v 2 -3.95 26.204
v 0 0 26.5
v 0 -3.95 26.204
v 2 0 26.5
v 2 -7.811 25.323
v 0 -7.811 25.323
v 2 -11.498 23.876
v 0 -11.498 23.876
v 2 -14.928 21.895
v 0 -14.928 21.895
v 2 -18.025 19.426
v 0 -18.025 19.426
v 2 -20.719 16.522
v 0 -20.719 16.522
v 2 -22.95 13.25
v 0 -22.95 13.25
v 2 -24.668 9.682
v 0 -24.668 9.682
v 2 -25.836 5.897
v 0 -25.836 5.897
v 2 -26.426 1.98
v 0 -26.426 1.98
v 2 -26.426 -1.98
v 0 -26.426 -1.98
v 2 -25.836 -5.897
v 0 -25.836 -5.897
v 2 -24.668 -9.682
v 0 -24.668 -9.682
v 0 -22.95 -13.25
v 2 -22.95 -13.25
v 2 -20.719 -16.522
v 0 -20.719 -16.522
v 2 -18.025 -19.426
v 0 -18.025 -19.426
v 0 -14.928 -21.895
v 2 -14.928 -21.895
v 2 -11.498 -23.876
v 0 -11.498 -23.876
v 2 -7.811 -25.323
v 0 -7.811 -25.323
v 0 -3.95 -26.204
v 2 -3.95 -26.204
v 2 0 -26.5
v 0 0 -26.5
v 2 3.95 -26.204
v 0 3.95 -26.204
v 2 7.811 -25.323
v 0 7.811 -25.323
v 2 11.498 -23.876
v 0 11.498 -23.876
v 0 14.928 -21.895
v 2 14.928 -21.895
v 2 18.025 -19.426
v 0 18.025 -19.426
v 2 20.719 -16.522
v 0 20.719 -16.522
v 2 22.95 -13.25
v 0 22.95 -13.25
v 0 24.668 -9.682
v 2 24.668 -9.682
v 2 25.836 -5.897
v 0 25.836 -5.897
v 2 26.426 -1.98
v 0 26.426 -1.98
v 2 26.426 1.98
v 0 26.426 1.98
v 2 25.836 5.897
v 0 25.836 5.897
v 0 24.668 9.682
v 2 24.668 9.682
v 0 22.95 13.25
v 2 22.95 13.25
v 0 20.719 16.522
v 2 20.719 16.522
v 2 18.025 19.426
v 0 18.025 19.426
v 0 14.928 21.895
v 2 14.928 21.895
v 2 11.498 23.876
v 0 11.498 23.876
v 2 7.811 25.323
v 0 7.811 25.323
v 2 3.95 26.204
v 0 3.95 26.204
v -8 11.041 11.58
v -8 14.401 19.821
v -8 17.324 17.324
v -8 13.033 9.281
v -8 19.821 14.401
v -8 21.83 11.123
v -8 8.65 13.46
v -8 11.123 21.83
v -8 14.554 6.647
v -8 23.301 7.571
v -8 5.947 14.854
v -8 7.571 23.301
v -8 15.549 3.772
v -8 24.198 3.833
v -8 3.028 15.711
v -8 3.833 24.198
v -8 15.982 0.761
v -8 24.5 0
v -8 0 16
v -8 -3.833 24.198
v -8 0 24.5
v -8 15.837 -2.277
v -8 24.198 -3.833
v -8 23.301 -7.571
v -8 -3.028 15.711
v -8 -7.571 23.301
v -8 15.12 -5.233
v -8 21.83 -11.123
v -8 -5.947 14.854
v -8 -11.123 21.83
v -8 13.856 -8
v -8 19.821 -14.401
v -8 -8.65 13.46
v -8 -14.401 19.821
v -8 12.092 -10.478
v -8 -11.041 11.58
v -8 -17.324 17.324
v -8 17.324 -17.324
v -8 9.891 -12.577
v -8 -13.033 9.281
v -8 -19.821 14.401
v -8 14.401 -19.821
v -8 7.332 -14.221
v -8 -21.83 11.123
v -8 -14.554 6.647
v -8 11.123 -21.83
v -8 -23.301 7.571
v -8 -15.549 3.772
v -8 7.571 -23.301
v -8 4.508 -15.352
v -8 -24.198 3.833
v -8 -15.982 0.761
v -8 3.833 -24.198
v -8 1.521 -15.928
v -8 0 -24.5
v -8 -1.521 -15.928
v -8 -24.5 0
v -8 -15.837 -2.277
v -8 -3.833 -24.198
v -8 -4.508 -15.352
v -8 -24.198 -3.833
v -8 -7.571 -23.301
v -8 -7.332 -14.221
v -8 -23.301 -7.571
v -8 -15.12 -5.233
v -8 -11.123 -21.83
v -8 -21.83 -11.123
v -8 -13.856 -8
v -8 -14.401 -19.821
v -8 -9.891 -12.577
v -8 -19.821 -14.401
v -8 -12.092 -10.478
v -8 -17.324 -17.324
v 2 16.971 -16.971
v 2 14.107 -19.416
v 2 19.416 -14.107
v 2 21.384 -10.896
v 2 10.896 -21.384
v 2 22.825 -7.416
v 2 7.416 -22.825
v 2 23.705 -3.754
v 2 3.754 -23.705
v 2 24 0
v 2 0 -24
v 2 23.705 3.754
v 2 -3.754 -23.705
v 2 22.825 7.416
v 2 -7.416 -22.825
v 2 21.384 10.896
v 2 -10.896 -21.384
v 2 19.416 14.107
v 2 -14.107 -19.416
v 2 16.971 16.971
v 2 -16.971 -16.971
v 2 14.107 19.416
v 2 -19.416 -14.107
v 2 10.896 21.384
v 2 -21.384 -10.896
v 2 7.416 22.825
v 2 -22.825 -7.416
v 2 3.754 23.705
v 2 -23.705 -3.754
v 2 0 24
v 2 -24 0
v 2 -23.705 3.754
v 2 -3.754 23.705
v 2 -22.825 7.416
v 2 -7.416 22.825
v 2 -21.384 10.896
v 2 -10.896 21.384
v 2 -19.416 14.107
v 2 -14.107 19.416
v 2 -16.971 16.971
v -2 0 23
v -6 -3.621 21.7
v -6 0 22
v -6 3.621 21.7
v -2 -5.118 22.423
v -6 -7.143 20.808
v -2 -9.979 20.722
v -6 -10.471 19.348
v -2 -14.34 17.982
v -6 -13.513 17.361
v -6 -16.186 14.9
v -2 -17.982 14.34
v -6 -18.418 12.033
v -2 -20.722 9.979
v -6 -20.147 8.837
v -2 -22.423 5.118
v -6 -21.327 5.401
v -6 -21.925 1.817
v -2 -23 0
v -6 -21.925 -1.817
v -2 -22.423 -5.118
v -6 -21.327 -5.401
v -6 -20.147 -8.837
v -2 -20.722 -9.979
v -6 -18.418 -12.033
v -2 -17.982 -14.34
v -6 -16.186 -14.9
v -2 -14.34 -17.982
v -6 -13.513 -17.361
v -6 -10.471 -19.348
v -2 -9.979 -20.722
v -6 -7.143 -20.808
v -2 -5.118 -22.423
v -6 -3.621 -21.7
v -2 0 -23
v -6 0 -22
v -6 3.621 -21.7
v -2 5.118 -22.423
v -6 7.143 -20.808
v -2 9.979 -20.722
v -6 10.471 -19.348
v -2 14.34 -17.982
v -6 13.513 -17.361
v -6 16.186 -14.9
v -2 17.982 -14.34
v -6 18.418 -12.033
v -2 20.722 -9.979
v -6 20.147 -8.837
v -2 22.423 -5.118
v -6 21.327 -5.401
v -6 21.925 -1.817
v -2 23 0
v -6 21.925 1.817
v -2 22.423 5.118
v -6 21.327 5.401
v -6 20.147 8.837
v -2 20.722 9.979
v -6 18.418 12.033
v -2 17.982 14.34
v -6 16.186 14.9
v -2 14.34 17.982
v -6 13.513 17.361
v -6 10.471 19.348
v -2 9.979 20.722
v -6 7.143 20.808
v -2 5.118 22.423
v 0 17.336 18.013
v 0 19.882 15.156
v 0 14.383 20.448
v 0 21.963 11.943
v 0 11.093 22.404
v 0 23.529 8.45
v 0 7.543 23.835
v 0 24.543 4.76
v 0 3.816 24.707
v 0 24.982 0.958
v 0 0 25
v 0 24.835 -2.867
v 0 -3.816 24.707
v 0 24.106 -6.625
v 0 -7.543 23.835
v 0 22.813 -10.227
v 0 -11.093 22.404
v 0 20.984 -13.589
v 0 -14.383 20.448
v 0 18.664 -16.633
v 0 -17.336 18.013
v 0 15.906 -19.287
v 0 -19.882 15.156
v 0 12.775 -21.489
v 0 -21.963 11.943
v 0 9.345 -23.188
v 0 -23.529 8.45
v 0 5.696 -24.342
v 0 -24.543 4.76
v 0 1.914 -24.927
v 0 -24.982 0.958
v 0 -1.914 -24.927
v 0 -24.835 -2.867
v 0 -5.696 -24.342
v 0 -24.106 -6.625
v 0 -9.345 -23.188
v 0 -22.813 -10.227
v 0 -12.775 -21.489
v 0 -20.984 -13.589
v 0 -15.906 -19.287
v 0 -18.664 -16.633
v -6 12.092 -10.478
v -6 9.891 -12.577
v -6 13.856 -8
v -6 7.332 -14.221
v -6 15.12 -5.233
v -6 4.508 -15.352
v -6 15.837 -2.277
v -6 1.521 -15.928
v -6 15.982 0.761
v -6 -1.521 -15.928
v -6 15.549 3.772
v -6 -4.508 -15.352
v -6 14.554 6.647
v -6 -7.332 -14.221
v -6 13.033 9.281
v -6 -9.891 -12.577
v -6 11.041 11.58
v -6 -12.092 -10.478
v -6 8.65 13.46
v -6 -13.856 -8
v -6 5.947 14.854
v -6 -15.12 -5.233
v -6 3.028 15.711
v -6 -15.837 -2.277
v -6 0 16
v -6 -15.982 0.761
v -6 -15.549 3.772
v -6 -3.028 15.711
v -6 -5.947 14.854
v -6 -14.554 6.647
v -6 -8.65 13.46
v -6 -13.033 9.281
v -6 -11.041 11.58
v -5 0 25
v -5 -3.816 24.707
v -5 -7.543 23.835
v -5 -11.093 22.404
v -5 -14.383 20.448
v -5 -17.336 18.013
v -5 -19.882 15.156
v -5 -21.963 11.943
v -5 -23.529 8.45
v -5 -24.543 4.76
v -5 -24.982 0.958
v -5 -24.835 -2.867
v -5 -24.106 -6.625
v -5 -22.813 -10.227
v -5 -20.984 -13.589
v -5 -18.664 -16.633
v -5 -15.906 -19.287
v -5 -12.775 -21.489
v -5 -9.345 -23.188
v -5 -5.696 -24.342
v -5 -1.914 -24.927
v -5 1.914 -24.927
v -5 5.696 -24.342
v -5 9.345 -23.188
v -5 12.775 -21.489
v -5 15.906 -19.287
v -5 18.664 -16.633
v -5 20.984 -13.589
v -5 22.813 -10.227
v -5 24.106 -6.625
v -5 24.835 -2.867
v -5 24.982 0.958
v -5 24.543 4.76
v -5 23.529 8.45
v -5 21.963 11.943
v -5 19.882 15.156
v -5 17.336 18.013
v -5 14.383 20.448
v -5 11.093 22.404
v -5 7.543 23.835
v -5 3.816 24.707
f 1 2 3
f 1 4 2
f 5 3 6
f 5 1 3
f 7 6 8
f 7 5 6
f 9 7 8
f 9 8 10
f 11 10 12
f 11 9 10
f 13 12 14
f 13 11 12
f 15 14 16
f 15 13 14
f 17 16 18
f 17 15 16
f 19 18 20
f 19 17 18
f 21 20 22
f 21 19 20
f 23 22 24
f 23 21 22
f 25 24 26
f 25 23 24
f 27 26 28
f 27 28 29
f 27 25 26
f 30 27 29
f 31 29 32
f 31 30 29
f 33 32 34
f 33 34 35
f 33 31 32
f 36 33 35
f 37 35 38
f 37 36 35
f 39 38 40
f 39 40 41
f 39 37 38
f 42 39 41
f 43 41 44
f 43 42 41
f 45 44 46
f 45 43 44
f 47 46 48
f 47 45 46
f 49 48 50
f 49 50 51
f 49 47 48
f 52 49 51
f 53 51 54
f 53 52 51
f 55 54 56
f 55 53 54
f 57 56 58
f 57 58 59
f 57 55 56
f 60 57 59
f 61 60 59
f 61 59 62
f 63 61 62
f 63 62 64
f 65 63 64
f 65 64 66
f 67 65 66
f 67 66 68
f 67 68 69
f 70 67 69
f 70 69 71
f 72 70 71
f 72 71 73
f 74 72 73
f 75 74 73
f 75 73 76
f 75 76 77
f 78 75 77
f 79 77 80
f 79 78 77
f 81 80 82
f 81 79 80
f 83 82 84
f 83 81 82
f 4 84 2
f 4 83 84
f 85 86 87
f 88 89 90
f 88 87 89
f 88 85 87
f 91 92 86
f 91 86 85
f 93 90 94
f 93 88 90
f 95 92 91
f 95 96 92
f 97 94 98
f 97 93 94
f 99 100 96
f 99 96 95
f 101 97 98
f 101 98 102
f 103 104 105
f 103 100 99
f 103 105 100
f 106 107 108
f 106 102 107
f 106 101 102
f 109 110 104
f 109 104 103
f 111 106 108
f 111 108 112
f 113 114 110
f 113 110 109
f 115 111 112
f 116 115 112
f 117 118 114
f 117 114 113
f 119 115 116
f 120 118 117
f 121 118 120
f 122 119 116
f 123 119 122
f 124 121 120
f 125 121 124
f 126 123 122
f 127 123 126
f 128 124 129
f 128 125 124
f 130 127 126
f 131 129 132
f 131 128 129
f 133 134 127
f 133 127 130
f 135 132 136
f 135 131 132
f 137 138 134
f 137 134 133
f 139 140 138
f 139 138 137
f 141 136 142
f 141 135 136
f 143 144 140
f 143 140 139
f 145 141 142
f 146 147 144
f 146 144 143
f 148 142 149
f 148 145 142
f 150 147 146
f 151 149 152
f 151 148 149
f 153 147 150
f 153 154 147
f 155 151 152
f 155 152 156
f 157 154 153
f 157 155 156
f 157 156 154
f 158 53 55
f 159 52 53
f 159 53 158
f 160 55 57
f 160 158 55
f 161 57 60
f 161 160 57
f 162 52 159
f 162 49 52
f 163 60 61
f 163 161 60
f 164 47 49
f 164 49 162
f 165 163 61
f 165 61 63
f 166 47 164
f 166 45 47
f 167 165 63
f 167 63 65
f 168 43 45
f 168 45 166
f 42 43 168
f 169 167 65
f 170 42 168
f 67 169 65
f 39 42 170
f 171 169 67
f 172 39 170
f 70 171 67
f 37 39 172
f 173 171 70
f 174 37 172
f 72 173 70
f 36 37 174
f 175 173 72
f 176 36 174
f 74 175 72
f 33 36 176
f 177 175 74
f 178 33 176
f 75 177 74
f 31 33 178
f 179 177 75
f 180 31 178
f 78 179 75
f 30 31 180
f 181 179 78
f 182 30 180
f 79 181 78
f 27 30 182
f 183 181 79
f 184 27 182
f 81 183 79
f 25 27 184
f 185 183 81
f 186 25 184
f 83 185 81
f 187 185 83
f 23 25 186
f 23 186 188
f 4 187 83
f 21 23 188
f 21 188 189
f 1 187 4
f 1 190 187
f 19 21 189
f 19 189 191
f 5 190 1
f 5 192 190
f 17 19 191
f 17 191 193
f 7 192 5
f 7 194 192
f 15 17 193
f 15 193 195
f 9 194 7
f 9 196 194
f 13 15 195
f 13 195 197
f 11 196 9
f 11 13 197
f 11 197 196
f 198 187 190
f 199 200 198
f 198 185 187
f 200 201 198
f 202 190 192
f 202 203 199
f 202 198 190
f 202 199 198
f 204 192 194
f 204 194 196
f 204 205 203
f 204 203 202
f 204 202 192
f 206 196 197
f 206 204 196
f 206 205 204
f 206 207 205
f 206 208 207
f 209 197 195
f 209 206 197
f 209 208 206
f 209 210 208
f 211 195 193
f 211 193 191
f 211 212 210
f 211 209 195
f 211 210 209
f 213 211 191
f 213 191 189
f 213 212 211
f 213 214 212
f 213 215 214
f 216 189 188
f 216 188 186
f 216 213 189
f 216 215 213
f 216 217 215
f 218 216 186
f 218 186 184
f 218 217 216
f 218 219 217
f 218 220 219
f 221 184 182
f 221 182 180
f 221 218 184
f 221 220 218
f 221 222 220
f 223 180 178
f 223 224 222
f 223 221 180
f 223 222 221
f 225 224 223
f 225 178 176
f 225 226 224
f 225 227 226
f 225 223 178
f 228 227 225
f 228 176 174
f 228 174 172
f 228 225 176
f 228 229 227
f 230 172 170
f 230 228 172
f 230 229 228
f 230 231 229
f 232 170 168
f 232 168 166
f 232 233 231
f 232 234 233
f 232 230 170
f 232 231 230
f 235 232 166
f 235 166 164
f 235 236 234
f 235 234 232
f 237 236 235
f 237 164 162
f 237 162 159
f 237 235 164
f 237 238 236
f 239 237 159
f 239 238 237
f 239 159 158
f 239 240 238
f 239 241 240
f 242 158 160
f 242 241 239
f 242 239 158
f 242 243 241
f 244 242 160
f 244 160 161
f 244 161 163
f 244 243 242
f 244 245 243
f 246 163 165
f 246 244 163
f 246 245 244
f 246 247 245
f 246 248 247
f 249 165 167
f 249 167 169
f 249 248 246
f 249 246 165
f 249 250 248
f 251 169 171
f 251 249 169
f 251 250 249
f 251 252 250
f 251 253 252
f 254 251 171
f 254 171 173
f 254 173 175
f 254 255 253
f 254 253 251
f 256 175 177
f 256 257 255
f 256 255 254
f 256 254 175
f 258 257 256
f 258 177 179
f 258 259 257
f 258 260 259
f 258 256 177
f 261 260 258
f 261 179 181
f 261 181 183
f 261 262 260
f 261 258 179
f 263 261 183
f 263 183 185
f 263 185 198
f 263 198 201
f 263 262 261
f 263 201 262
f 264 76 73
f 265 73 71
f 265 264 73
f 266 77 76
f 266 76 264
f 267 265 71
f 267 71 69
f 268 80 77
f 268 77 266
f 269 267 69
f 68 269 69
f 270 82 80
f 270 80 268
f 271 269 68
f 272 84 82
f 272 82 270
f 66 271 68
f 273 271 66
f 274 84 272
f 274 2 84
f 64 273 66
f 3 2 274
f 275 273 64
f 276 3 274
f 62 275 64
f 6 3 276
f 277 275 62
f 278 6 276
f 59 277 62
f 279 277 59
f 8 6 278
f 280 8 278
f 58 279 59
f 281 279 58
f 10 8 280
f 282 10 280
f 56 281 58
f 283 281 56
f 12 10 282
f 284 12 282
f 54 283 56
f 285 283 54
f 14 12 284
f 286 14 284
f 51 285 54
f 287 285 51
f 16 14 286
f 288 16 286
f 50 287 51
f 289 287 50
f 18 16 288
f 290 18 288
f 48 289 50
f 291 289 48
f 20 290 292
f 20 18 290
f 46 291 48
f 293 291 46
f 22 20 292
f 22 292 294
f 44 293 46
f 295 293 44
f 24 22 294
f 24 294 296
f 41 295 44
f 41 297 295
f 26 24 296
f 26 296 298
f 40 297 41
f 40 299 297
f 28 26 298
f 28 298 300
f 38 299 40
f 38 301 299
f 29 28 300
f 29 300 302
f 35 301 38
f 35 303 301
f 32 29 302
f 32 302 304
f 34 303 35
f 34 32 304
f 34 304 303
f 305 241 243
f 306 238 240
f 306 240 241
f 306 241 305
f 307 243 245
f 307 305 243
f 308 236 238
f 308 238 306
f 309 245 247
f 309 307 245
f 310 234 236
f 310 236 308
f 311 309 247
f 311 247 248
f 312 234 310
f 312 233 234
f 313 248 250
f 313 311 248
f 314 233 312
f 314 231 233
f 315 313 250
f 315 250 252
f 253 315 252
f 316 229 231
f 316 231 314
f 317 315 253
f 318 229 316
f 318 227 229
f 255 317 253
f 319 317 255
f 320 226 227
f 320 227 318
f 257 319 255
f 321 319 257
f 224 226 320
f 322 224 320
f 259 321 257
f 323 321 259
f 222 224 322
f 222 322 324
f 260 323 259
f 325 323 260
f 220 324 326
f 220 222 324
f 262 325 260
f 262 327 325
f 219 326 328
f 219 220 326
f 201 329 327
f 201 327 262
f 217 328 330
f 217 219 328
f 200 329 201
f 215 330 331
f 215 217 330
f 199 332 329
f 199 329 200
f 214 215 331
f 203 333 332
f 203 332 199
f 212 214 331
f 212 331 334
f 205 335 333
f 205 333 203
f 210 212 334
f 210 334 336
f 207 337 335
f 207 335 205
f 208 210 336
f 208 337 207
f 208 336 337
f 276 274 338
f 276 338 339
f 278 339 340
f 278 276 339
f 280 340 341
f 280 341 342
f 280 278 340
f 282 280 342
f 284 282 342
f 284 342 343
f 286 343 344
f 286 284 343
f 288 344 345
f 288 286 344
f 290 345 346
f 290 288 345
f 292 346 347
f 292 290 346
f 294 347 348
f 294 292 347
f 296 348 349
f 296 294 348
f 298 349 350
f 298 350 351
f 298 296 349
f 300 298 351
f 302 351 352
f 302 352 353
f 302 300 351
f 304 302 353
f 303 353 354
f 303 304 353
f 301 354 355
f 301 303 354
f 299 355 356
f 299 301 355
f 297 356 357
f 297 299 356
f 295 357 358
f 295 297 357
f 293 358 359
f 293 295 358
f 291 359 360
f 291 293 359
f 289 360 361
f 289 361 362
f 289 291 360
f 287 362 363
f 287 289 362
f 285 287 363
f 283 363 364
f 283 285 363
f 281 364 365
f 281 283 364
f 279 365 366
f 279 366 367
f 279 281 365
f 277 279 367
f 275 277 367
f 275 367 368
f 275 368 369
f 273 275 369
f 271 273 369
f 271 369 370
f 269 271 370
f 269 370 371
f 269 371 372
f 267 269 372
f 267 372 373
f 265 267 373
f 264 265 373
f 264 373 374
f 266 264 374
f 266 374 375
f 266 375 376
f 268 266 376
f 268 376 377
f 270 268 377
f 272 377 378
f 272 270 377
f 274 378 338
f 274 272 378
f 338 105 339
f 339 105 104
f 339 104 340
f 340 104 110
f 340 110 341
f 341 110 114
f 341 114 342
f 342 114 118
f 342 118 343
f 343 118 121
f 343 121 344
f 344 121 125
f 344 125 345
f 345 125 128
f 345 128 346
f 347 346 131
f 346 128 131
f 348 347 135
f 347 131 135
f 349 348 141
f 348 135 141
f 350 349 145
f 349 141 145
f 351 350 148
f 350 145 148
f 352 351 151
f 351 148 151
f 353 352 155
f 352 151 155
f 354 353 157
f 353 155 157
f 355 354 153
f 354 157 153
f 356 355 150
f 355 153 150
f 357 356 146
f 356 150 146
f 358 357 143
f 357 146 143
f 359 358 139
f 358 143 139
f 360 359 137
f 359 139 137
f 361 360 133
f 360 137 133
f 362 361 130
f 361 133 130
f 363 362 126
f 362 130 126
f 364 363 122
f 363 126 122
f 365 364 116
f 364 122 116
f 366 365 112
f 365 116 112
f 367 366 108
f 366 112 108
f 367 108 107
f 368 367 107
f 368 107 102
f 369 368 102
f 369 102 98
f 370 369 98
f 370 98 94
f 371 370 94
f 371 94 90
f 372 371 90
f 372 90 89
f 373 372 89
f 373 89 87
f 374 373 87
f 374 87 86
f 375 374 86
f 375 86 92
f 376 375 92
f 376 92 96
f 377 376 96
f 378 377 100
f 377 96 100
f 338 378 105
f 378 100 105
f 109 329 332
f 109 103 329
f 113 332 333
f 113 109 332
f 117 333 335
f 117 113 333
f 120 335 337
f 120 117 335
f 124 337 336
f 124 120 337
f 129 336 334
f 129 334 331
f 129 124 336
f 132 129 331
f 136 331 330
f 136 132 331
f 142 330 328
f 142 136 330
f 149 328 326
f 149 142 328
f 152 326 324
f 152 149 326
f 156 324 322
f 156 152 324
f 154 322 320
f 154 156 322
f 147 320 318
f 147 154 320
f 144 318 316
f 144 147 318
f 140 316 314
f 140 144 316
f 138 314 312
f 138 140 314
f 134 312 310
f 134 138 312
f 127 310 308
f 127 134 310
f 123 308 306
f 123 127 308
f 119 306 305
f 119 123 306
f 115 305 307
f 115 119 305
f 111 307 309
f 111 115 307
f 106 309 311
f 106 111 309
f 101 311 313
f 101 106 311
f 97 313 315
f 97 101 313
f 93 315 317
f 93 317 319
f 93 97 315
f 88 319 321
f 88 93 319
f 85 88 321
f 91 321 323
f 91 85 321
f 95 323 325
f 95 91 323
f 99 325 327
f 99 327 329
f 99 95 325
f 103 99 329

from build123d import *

# Parameters (mm, degrees)
SFAZOWANIE1_SIZE  = 3
SFAZOWANIE1_SIZE2 = 0.5


with BuildPart() as part:
    # Szkic1 → Obrót1 (revolve)
    with BuildSketch(Plane.XY, mode=Mode.PRIVATE) as obr_t1_sk:
        Polygon((0, 26.5), (2, 26.5), (2, 24), (-6, 22), (-6, 16), (-8, 16), (-8, 25), (0, 25), align=None)
    revolve(obr_t1_sk.sketch.rotate(Axis((-21.448486922, 0, 0), (1, 0, 0)), 90), axis=Axis((-21.448486922, 0, 0), (1, 0, 0)))

    # Sfazowanie1
    sfazowanie1_edges = [part.edges().sort_by_distance(p)[0] for p in [
        (-8, 0, -25),
    ]]
    sfazowanie1_side = [part.faces().sort_by_distance(p)[0] for p in [
        (-4, 0, -25),
    ]]
    chamfer(sfazowanie1_edges, length=SFAZOWANIE1_SIZE, length2=SFAZOWANIE1_SIZE2, reference=sfazowanie1_side[0])


solid = part.part
